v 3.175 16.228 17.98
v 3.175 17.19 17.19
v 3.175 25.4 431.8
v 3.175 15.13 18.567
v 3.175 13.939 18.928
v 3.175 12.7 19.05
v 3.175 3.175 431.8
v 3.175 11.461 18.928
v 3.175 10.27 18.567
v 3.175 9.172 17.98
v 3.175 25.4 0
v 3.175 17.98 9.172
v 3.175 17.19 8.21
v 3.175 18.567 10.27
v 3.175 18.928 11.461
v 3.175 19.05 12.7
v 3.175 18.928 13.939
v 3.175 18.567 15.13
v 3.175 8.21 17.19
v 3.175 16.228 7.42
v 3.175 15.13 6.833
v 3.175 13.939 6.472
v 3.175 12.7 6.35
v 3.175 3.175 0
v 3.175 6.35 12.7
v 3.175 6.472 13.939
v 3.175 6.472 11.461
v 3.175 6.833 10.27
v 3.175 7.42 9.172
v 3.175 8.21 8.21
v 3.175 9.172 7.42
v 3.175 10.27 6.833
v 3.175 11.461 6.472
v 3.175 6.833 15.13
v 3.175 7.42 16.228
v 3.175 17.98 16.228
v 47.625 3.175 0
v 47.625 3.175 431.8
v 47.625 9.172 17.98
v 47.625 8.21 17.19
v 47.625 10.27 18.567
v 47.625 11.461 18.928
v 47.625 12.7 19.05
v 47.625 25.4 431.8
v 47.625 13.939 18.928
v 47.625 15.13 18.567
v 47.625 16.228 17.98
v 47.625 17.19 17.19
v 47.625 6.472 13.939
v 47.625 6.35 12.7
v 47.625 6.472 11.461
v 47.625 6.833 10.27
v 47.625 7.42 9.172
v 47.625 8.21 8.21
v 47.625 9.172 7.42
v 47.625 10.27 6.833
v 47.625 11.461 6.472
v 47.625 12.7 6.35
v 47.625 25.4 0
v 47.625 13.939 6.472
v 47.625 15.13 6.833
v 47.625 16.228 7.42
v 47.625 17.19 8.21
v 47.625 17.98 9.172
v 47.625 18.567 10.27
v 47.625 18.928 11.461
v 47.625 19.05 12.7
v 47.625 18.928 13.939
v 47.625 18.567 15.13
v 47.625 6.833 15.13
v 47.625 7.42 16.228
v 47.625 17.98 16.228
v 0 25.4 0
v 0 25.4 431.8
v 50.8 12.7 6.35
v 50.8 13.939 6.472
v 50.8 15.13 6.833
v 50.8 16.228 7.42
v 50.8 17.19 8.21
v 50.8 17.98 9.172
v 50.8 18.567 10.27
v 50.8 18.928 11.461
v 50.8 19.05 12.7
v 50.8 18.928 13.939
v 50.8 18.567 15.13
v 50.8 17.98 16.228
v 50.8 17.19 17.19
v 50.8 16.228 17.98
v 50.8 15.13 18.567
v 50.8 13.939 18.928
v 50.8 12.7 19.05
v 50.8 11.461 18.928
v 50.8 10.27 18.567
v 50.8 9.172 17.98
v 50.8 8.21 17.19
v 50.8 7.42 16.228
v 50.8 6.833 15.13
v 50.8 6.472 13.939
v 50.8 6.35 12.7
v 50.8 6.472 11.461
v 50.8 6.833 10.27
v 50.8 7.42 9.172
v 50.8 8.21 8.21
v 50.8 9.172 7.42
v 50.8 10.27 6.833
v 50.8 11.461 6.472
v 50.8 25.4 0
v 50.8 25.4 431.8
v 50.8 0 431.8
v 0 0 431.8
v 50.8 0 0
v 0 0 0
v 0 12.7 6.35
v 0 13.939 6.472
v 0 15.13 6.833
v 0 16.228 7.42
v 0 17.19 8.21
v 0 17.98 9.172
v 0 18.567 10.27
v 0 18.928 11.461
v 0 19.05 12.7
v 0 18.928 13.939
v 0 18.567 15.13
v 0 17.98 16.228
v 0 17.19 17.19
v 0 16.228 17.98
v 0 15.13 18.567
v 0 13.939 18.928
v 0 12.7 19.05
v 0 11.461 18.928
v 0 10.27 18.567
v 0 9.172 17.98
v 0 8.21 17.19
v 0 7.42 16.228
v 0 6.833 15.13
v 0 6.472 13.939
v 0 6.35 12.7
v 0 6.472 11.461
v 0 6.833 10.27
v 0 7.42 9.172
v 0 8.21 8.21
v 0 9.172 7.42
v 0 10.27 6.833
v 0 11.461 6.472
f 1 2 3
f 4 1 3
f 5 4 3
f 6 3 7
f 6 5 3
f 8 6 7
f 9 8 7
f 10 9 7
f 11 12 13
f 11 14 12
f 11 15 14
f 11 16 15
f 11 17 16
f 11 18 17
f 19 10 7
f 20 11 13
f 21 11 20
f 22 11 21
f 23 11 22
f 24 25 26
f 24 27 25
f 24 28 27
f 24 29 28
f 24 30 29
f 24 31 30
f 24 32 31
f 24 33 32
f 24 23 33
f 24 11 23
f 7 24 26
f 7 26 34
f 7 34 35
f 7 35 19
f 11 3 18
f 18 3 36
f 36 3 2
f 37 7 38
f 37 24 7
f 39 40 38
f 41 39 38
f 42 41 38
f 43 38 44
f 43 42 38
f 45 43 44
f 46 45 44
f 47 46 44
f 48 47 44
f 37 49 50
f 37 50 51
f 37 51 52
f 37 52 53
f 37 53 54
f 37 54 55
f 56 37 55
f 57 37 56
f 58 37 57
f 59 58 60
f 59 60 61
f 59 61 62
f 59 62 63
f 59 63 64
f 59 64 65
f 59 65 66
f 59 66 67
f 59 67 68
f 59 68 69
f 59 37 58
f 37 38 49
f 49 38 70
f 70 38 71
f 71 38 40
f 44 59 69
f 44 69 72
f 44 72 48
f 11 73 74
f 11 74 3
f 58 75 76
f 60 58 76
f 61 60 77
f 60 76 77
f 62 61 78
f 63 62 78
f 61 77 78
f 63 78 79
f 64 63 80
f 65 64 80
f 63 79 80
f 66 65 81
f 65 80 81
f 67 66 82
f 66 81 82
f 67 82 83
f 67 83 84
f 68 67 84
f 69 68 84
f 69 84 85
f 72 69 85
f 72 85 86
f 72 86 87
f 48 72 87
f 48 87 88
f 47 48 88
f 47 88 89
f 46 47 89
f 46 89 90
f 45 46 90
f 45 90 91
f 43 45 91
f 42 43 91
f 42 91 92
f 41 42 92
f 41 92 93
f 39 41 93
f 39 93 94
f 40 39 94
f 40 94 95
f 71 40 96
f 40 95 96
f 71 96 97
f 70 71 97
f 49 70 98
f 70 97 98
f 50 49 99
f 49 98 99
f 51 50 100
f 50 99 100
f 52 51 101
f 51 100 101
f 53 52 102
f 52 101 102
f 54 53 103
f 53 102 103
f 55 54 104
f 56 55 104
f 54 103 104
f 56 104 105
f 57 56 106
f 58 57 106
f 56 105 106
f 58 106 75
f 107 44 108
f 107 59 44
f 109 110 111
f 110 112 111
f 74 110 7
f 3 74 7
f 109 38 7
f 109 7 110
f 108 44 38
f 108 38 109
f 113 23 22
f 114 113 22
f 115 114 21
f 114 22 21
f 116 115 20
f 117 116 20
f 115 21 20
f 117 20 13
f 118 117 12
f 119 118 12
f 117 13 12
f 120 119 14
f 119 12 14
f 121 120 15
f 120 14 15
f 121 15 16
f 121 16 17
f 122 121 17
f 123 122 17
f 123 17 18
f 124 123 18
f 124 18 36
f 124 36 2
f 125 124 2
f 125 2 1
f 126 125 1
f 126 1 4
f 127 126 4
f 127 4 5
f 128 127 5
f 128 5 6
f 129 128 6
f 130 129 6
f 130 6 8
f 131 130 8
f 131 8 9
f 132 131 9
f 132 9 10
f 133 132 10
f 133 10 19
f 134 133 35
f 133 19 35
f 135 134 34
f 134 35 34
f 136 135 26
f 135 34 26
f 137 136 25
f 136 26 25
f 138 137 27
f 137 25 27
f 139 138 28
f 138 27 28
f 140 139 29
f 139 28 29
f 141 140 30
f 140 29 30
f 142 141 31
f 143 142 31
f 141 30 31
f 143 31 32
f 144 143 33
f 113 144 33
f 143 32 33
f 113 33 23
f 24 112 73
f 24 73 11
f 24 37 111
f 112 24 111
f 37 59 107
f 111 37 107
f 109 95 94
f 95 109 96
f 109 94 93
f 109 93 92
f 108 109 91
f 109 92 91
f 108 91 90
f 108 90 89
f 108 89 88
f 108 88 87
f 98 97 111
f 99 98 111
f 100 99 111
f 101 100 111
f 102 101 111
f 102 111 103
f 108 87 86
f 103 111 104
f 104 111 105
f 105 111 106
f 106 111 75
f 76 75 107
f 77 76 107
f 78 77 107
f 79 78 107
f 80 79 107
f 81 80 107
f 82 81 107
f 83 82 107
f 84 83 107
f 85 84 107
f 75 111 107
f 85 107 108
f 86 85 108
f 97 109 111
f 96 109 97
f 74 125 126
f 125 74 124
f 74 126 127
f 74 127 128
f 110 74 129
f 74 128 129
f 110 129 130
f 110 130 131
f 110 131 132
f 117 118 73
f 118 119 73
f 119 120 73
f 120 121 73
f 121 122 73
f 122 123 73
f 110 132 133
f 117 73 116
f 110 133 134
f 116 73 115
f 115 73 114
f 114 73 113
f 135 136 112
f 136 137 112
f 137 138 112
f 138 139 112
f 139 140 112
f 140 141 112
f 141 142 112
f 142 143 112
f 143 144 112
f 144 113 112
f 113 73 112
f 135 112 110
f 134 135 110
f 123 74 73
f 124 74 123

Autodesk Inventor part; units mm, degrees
ref_plane "YZ Plane" through (0, 0, 0) normal (1, 0, 0) x (0, 1, 0)
ref_plane "XZ Plane" through (0, 0, 0) normal (0, 1, 0) x (-1, 0, 0)
ref_plane "XY Plane" through (0, 0, 0) normal (0, 0, 1) x (1, 0, 0)
sketch "Sketch1" plane through (0, 0, 0) normal (0, 0, 1) x (1, 0, 0)
  line L0 (0, 0) -> (50.8, 0)
  line L1 (50.8, 0) -> (50.8, 25.4)
  line L2 (0, 25.4) -> (0, 0)
  line L3 (3.175, 3.175) -> (47.625, 3.175)
  line L4 (47.625, 3.175) -> (47.625, 25.4)
  line L5 (3.175, 25.4) -> (3.175, 3.175)
  line L6 (0, 25.4) -> (3.175, 25.4)
  line L7 (47.625, 25.4) -> (50.8, 25.4)
  dimension "d0" = 50.8
  dimension "d1" = 25.4
  dimension "d2" = 3.175
  dimension "d3" = 3.175
  dimension "d5" = 3.175
extrude "Extrusion1" add sketch "Sketch1" along normal blind 431.8
sketch "Sketch2" plane through (50.8, 0, 0) normal (1, 0, 0) x (0, 0, -1)
  line L0 (0, 0) -> (0, 25.4) projected
  line L1 (0, 25.4) -> (-431.8, 25.4) projected
  circle A0 centre (-12.7, 12.7) radius 6.35
  dimension "d8" = 12.7
  dimension "d9" = 12.7
  dimension "d10" = 12.7
extrude "Extrusion2" cut sketch "Sketch2" against normal blind 431.8
equation "\"d2\" = d5"
equation "\"d5\" = d4"
equation "\"d4\" = d3"
properties part number "shooter U frame"
